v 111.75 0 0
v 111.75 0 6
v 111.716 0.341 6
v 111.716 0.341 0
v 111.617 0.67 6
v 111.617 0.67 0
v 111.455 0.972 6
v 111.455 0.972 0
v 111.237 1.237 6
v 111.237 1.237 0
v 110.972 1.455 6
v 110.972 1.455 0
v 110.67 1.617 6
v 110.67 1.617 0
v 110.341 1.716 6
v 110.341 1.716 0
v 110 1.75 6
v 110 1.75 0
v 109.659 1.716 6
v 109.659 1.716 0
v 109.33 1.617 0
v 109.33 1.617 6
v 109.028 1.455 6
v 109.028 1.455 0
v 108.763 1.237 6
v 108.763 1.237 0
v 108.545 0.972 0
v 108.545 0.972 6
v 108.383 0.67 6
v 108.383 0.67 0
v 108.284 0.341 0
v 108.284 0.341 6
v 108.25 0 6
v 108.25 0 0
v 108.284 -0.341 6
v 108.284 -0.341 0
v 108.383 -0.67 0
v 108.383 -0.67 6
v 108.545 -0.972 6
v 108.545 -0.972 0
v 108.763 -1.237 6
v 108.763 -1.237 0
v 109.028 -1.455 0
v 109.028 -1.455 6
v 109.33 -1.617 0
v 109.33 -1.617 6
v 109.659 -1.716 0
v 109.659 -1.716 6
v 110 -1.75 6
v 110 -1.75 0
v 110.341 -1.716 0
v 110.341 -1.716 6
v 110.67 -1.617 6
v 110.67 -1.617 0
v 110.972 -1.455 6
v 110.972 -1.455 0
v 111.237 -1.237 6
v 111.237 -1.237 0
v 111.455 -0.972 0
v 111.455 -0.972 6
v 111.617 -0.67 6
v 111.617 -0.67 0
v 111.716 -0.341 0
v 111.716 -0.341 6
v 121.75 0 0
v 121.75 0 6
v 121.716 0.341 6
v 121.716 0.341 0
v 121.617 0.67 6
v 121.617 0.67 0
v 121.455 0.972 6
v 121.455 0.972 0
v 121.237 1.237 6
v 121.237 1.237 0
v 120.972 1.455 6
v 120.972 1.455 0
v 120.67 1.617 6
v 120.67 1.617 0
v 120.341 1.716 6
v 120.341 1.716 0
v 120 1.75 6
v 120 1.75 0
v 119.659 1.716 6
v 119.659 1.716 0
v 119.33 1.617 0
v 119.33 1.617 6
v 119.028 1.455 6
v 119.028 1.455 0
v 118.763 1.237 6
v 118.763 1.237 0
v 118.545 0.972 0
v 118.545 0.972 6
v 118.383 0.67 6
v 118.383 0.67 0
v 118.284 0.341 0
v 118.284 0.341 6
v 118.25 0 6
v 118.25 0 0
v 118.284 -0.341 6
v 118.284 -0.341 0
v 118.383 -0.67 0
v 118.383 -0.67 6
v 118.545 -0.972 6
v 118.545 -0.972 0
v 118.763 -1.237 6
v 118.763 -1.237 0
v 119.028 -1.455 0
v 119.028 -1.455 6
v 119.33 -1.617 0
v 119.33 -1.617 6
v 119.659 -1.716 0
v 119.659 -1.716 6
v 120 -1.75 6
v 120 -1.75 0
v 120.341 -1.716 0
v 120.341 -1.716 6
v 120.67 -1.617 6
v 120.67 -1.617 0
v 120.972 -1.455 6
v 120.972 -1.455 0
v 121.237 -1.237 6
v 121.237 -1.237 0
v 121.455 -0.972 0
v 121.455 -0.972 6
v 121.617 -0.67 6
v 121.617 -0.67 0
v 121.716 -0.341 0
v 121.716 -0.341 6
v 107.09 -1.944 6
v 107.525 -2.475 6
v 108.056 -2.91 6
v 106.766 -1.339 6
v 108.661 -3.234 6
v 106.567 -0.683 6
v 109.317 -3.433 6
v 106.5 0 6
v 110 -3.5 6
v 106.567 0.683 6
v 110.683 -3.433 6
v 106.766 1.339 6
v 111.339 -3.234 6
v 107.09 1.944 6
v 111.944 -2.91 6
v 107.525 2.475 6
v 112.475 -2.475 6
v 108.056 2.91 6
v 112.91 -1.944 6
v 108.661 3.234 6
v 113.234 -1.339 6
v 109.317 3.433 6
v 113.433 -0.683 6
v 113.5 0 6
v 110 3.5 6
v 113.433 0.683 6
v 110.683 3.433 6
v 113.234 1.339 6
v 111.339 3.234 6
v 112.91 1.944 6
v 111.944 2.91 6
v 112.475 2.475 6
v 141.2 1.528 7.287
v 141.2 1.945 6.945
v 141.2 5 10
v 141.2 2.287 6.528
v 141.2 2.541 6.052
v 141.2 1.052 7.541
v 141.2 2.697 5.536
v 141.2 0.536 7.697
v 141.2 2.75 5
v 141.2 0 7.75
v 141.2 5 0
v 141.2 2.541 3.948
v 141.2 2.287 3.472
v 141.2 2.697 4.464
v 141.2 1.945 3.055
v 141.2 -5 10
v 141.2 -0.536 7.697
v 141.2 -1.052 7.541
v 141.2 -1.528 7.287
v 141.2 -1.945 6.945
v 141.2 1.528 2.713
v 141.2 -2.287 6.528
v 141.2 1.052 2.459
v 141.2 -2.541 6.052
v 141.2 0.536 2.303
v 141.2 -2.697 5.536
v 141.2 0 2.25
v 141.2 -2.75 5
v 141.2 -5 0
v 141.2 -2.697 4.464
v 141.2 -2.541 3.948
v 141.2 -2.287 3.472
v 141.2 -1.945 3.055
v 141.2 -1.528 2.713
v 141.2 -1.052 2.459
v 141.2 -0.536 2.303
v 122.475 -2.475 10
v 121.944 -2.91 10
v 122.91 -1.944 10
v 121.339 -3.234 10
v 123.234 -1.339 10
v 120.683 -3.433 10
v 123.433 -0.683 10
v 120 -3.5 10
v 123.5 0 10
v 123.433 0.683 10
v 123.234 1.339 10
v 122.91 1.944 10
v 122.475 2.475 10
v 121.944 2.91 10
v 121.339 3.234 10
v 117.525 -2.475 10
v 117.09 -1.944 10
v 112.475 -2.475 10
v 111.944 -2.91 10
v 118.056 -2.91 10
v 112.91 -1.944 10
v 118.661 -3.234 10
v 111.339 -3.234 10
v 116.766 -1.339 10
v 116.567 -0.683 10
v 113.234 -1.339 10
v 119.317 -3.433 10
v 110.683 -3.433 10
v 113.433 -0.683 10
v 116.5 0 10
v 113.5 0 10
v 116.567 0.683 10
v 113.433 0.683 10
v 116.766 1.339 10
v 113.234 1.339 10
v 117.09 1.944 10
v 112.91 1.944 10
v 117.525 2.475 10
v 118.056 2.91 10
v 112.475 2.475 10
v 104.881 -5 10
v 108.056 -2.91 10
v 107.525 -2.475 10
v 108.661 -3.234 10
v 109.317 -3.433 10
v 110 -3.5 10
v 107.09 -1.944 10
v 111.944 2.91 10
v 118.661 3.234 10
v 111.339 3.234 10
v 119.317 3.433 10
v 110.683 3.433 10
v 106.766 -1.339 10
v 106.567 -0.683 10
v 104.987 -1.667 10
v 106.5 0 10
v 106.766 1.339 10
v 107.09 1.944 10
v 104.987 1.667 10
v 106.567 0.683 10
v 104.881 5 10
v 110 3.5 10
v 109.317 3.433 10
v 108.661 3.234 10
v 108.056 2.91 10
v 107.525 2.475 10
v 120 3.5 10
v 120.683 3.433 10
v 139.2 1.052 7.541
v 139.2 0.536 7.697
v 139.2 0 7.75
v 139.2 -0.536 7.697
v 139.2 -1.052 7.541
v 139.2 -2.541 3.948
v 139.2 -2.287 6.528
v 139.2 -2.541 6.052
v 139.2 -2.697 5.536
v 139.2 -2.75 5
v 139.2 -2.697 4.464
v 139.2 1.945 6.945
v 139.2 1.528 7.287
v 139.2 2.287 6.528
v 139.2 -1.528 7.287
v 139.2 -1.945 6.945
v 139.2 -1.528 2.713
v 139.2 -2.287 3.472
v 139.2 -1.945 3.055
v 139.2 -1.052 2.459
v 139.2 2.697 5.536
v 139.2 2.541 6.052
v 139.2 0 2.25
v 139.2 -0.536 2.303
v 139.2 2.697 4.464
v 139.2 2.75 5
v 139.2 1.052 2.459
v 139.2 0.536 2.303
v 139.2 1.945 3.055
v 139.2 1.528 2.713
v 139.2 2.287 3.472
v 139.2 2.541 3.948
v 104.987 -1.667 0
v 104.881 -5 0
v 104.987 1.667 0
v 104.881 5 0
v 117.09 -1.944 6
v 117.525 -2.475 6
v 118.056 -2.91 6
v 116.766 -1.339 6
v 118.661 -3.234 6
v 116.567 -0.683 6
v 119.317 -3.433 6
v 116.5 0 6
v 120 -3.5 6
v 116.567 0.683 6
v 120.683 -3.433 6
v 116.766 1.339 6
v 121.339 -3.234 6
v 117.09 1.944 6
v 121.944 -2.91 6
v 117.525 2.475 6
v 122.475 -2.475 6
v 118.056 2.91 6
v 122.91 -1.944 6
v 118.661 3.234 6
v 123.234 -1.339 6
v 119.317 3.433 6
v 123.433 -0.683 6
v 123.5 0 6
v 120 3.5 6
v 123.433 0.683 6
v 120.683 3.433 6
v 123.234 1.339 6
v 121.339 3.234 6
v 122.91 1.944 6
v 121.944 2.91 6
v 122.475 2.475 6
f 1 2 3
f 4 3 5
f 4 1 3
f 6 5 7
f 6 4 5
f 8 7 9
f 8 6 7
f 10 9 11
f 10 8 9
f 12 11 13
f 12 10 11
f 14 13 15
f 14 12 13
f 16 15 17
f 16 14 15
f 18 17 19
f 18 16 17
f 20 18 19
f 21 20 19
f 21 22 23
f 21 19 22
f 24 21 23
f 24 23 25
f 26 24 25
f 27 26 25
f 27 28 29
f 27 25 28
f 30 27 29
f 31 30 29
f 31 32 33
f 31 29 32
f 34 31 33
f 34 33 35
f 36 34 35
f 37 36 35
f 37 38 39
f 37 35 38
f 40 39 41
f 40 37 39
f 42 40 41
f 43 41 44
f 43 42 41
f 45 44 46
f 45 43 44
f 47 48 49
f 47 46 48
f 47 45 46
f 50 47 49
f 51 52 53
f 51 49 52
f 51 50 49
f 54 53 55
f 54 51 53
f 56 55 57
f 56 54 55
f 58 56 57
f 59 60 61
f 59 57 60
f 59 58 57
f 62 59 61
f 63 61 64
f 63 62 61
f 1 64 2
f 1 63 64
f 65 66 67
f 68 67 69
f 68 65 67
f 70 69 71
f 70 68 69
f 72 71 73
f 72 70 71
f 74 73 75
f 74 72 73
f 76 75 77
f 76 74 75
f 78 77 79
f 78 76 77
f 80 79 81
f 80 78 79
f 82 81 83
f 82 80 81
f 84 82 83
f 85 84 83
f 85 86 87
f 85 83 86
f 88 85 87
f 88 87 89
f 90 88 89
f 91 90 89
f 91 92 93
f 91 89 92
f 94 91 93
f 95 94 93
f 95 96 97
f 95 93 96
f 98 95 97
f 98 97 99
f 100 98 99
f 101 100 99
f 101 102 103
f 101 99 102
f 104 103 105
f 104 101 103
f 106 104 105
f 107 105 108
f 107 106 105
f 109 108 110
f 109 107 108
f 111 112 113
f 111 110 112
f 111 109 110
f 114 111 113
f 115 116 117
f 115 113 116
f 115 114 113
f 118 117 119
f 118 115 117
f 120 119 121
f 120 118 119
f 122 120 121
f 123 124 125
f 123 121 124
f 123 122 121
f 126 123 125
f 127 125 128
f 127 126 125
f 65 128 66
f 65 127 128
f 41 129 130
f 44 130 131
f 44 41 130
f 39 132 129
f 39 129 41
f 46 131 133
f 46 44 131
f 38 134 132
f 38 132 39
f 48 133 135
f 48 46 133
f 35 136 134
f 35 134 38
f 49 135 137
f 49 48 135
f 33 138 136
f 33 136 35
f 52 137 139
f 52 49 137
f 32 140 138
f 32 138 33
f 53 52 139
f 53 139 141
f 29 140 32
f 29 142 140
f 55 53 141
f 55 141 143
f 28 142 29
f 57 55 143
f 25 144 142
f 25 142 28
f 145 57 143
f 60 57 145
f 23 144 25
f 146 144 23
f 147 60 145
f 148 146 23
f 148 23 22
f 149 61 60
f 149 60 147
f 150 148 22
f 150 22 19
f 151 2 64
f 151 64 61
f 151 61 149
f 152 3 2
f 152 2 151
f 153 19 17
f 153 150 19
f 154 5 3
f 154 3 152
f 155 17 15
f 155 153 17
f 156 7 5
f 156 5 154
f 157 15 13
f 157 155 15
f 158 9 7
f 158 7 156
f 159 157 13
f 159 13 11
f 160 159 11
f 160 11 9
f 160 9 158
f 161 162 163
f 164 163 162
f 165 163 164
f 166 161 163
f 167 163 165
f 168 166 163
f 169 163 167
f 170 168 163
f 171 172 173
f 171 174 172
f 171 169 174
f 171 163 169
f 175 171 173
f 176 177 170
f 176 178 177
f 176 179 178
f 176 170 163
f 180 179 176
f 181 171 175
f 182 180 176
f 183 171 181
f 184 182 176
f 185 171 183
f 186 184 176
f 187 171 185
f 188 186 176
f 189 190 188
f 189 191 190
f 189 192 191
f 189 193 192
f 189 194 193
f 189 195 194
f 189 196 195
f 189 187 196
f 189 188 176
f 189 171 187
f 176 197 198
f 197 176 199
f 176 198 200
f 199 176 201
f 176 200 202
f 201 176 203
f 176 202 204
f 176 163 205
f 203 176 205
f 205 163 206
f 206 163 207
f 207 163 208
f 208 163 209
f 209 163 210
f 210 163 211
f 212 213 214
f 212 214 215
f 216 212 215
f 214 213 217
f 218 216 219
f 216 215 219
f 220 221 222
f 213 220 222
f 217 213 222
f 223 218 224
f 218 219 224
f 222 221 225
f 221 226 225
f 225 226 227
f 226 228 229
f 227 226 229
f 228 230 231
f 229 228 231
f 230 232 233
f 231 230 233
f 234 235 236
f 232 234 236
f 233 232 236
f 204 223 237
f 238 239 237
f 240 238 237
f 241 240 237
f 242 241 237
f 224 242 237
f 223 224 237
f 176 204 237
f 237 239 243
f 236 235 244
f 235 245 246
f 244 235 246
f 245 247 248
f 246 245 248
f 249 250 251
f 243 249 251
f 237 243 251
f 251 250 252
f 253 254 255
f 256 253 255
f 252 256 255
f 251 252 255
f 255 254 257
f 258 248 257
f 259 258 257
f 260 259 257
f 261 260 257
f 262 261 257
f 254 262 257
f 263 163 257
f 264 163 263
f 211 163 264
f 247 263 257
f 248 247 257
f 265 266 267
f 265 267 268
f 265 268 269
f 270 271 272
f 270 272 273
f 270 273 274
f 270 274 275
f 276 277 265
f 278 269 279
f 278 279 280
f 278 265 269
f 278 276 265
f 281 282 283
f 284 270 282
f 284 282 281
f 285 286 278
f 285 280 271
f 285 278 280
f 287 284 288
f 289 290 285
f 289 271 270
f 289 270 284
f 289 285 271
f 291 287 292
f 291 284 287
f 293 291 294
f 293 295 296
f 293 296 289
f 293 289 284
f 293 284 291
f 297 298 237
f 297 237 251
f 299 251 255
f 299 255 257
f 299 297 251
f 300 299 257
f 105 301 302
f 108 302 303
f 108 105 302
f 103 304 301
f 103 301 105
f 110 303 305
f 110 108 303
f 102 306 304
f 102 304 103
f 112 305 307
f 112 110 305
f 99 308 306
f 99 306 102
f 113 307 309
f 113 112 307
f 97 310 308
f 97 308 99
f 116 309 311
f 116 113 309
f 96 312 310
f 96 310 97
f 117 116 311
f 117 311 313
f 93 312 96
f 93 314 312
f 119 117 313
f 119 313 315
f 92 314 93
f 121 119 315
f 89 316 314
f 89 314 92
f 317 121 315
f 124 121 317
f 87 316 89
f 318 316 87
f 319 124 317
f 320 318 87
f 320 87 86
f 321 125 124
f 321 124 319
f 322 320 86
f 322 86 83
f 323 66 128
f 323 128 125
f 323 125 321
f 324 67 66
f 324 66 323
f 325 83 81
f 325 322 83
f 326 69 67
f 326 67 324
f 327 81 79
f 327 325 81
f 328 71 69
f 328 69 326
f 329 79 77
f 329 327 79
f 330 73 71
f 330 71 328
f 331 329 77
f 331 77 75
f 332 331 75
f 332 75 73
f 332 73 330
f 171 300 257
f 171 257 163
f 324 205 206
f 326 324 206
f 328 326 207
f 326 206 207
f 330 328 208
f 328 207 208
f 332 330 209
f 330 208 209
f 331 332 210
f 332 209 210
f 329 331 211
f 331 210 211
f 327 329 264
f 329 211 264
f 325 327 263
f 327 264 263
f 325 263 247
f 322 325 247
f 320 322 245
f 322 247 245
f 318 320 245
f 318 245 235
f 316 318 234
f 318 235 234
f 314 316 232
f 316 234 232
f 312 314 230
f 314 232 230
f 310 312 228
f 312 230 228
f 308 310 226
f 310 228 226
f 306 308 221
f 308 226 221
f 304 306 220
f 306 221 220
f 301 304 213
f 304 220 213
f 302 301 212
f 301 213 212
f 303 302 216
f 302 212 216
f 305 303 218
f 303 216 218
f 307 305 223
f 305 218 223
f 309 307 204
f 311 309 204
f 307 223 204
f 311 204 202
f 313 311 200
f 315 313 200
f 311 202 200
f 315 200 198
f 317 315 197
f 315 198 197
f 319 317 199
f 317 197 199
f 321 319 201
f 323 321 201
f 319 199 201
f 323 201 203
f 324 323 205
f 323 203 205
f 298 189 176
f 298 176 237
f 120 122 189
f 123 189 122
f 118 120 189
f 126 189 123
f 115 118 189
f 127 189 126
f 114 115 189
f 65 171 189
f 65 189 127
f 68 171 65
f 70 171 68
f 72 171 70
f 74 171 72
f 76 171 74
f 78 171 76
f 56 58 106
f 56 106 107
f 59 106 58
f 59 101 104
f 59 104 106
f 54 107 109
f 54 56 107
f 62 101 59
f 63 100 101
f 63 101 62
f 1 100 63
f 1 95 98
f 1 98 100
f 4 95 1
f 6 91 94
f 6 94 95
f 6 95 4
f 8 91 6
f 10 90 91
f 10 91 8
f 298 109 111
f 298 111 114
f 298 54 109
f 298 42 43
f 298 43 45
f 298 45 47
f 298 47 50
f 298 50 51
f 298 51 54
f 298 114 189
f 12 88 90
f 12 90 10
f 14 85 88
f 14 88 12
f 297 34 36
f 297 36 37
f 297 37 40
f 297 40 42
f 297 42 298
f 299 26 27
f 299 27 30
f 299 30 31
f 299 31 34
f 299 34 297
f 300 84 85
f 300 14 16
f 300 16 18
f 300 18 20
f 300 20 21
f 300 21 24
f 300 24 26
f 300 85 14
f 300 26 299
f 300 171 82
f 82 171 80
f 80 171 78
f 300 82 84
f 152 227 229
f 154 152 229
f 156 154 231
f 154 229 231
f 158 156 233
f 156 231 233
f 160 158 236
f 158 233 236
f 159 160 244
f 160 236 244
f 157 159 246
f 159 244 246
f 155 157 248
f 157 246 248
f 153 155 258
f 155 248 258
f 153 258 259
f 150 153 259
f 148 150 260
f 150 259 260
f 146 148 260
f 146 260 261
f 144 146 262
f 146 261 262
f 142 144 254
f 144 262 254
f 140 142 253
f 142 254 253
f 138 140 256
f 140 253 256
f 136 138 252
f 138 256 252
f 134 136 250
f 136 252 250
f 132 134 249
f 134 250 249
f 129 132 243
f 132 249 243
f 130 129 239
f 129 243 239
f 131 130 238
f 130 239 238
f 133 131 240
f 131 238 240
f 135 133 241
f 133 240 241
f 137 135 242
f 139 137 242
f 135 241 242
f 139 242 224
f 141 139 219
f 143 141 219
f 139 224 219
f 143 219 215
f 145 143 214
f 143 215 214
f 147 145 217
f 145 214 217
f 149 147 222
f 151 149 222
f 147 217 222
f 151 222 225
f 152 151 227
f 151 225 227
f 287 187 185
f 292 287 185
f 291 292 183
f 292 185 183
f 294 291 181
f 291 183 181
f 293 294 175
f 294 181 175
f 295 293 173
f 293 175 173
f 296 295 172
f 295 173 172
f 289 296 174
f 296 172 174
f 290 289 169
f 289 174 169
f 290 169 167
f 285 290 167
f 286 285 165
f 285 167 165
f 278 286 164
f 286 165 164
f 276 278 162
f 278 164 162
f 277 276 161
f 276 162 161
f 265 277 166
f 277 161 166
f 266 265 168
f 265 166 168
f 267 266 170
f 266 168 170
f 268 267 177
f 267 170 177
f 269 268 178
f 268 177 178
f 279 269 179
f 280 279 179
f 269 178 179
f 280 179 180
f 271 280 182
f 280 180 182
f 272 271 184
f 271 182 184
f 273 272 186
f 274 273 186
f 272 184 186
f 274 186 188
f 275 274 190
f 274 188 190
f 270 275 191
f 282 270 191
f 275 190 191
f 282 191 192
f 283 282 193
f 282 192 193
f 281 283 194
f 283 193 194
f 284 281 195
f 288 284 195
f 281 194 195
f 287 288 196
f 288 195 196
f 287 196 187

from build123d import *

# Parameters (mm, degrees)
ESQUISSE1_R             = 1.75
BOSS_EXTRU_1_DEPTH      = 10
ESQUISSE2_R             = 2.75
ENL_V_MAT_EXTRU_1_DEPTH = 2
ESQUISSE3_R             = 3.5
ENL_V_MAT_EXTRU_2_DEPTH = 4


with BuildPart() as part:
    # Esquisse1 → Boss.-Extru.1 (new body)
    with BuildSketch(Plane.XY):
        with BuildLine():
            Line((104.880884817, 5), (141.2, 5))
            Line((141.2, 5), (141.2, -5))
            Line((141.2, -5), (104.880884817, -5))
            ThreePointArc((104.880884817, -5), (105, 0), (104.880884817, 5))
        make_face()
        with Locations((110, 0)):
            Circle(ESQUISSE1_R, mode=Mode.SUBTRACT)
        with Locations((120, 0)):
            Circle(ESQUISSE1_R, mode=Mode.SUBTRACT)
    extrude(amount=BOSS_EXTRU_1_DEPTH)

    # Esquisse2 → Enlèv. mat.-Extru.1 (cut)
    with BuildSketch(Plane(origin=(141.2, 0, 0), x_dir=(0, 0, -1), z_dir=(1, 0, 0))):
        with Locations((-5, 0)):
            Circle(ESQUISSE2_R)
    extrude(amount=-ENL_V_MAT_EXTRU_1_DEPTH, mode=Mode.SUBTRACT)

    # Esquisse3 → Enlèv. mat.-Extru.2 (cut)
    with BuildSketch(Plane.XY.offset(10)):
        with Locations((110, 0)):
            Circle(ESQUISSE3_R)
        with Locations((120, 0)):
            Circle(ESQUISSE3_R)
    extrude(amount=-ENL_V_MAT_EXTRU_2_DEPTH, mode=Mode.SUBTRACT)


solid = part.part
